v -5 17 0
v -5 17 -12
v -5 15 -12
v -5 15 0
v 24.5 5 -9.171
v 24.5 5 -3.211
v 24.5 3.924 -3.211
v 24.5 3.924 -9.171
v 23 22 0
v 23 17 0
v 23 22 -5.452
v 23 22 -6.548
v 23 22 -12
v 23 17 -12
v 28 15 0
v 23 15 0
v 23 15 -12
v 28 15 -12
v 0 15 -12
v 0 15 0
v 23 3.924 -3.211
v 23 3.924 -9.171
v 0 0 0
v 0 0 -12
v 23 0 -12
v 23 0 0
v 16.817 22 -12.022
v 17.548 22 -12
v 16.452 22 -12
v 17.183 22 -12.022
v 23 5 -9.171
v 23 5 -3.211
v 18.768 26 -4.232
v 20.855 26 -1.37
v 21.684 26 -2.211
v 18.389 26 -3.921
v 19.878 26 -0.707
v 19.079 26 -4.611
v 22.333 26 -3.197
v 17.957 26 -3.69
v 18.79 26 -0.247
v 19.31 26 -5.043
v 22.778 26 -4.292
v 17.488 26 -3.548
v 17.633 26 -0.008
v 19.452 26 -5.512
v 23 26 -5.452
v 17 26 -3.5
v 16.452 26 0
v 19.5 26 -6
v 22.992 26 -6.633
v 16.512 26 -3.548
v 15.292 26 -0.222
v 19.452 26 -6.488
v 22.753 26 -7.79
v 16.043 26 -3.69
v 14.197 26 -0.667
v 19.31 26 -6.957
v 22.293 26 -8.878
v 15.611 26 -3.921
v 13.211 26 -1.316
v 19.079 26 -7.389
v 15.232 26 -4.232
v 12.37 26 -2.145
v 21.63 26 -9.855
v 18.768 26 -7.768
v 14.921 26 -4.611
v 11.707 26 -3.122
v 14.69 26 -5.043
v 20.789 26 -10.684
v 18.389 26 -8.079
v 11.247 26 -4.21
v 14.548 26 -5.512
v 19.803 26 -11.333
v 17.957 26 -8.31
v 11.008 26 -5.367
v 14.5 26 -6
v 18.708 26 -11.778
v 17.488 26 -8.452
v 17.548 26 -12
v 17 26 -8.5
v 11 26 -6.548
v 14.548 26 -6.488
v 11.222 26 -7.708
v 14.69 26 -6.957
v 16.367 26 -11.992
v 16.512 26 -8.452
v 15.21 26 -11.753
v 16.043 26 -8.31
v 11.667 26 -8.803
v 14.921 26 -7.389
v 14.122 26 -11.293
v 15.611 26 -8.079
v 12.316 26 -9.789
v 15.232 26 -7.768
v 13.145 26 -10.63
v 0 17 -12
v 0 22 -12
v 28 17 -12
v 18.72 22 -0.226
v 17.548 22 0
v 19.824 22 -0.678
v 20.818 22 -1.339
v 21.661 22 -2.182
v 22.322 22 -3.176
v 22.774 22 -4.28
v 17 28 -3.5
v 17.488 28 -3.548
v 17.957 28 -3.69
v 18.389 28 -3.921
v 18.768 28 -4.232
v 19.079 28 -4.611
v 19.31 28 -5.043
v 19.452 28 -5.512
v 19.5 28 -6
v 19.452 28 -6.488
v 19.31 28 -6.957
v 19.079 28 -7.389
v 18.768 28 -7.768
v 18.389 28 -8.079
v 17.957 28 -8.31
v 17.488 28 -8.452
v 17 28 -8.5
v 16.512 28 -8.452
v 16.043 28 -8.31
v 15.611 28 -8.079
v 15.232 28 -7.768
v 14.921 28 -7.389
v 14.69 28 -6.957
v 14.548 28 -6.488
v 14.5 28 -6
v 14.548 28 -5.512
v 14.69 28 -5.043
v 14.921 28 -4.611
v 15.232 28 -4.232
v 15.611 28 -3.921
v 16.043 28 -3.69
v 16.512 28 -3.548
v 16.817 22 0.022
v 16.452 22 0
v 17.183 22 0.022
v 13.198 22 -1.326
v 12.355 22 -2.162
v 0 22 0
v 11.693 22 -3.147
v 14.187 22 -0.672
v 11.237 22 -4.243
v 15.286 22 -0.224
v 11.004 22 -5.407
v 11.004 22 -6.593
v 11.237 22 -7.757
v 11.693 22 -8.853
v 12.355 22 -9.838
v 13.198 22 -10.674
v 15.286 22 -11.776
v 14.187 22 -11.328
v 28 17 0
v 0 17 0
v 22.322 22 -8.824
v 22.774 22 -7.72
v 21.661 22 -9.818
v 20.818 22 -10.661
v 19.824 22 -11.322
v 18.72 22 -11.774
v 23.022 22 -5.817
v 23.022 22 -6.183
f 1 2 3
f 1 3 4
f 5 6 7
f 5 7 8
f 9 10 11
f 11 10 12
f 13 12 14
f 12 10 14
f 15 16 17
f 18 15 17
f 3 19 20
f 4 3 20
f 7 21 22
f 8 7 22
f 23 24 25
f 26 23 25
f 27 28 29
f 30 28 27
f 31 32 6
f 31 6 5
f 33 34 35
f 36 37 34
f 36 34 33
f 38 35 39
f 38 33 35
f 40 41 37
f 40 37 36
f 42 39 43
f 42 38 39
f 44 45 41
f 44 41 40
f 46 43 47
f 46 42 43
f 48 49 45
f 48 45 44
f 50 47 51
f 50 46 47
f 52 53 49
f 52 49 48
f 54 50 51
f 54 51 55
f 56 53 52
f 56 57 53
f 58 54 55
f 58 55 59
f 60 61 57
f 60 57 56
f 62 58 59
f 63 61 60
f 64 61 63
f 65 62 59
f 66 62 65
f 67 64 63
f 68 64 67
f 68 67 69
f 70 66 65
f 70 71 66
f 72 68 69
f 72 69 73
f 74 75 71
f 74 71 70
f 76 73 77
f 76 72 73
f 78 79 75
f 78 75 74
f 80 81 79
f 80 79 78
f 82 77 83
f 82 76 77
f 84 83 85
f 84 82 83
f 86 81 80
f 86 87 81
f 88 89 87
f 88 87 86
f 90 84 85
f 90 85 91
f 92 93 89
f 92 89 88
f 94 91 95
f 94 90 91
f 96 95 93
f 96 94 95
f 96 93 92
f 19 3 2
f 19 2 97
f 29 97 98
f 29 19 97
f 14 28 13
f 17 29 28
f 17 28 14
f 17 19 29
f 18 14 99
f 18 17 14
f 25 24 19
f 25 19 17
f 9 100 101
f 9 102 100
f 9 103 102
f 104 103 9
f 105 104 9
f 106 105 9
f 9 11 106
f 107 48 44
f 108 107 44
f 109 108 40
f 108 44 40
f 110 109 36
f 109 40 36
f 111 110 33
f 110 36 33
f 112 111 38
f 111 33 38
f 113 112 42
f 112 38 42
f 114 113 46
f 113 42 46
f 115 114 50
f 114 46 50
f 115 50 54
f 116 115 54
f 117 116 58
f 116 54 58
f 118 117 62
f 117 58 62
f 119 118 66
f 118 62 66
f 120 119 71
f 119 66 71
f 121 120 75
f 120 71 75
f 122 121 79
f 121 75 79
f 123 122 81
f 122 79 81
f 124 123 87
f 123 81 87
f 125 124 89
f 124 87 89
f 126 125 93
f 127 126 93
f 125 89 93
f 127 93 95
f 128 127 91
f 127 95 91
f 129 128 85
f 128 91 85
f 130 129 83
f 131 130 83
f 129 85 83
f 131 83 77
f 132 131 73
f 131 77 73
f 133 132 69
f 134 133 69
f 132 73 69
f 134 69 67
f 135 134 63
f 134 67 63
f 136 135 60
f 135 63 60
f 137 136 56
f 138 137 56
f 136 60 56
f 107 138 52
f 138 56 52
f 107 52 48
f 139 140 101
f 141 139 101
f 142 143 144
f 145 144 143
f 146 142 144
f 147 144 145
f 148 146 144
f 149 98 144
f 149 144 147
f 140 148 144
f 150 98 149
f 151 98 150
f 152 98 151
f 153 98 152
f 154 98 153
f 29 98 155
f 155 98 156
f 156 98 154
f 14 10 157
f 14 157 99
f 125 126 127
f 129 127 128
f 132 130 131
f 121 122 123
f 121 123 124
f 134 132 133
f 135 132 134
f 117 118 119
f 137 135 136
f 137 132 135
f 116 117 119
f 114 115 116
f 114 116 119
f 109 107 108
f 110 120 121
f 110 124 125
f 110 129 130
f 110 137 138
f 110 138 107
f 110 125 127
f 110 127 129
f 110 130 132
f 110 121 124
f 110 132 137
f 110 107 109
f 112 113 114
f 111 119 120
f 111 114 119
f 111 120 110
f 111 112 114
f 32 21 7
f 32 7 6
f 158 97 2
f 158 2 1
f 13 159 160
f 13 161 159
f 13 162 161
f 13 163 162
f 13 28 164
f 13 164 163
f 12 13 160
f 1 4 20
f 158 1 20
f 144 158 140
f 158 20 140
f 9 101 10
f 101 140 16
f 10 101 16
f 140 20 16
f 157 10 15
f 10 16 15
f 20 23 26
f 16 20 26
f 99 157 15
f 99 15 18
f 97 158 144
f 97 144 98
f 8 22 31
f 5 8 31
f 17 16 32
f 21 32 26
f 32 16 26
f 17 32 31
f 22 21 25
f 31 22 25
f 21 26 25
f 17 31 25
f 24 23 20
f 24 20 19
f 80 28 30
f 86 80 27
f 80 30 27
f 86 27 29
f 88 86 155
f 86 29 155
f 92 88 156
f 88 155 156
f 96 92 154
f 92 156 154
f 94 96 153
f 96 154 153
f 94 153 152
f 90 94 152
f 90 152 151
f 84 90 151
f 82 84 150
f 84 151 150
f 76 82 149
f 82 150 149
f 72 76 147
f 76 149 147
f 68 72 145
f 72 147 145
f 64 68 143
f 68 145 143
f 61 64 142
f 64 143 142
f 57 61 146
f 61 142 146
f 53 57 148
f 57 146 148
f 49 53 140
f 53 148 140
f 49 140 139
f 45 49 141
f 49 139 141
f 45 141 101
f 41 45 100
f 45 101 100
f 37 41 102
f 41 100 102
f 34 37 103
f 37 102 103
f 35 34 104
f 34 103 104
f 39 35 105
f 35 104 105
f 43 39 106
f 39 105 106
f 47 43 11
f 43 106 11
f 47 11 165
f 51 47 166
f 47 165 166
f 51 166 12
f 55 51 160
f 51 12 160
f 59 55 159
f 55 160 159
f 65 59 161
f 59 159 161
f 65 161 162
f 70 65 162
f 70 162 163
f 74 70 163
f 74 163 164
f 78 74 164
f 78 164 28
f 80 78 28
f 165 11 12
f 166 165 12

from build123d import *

# Parameters (mm, degrees)
SKETCH_1_W      = 23
SKETCH_1_H      = 12
EXTRUDE_1_DEPTH = 22
SKETCH_2_W      = 12
SKETCH_2_H      = 2
EXTRUDE_2_DEPTH = 5
SKETCH_3_W      = 5.960545255
SKETCH_3_H      = 1.076312346
EXTRUDE_3_DEPTH = 1.5
SKETCH_4_W      = 12
SKETCH_4_H      = 2
EXTRUDE_4_DEPTH = 5
SKETCH_5_R      = 6.025
EXTRUDE_5_DEPTH = 4
SKETCH_6_R      = 2.5
EXTRUDE_6_DEPTH = 2


with BuildPart() as part:
    # 草图1 → 凸台-拉伸1 (new body)
    with BuildSketch(Plane(origin=(0, 0, 0), x_dir=(1, 0, 0), z_dir=(0, 1, 0))):
        with Locations((11.5, 6)):
            Rectangle(SKETCH_1_W, SKETCH_1_H)
    extrude(amount=EXTRUDE_1_DEPTH)

    # 草图2 → 凸台-拉伸2 (add)
    with BuildSketch(Plane(origin=(23, 0, 0), x_dir=(0, 0, -1), z_dir=(1, 0, 0))):
        with Locations((6, 16)):
            Rectangle(SKETCH_2_W, SKETCH_2_H)
    extrude(amount=EXTRUDE_2_DEPTH)

    # 草图3 → 凸台-拉伸3 (add)
    with BuildSketch(Plane(origin=(23, 0, 0), x_dir=(0, 0, -1), z_dir=(1, 0, 0))):
        with Locations((6.190854898, 4.461843827)):
            Rectangle(SKETCH_3_W, SKETCH_3_H)
    extrude(amount=EXTRUDE_3_DEPTH)

    # 草图4 → 凸台-拉伸4 (add)
    with BuildSketch(Plane.ZY):
        with Locations((-6, 16)):
            Rectangle(SKETCH_4_W, SKETCH_4_H)
    extrude(amount=EXTRUDE_4_DEPTH)

    # 草图5 → 凸台-拉伸5 (add)
    with BuildSketch(Plane(origin=(0, 22, 0), x_dir=(1, 0, 0), z_dir=(0, 1, 0))):
        with Locations(Location((17, 6, 0), (0, 0, 84.778691018))):
            Circle(SKETCH_5_R)
    extrude(amount=EXTRUDE_5_DEPTH)

    # 草图6 → 凸台-拉伸6 (add)
    with BuildSketch(Plane(origin=(0, 26, 0), x_dir=(1, 0, 0), z_dir=(0, 1, 0))):
        with Locations(Location((17, 6, 0), (0, 0, 270))):
            Circle(SKETCH_6_R)
    extrude(amount=EXTRUDE_6_DEPTH)


solid = part.part
